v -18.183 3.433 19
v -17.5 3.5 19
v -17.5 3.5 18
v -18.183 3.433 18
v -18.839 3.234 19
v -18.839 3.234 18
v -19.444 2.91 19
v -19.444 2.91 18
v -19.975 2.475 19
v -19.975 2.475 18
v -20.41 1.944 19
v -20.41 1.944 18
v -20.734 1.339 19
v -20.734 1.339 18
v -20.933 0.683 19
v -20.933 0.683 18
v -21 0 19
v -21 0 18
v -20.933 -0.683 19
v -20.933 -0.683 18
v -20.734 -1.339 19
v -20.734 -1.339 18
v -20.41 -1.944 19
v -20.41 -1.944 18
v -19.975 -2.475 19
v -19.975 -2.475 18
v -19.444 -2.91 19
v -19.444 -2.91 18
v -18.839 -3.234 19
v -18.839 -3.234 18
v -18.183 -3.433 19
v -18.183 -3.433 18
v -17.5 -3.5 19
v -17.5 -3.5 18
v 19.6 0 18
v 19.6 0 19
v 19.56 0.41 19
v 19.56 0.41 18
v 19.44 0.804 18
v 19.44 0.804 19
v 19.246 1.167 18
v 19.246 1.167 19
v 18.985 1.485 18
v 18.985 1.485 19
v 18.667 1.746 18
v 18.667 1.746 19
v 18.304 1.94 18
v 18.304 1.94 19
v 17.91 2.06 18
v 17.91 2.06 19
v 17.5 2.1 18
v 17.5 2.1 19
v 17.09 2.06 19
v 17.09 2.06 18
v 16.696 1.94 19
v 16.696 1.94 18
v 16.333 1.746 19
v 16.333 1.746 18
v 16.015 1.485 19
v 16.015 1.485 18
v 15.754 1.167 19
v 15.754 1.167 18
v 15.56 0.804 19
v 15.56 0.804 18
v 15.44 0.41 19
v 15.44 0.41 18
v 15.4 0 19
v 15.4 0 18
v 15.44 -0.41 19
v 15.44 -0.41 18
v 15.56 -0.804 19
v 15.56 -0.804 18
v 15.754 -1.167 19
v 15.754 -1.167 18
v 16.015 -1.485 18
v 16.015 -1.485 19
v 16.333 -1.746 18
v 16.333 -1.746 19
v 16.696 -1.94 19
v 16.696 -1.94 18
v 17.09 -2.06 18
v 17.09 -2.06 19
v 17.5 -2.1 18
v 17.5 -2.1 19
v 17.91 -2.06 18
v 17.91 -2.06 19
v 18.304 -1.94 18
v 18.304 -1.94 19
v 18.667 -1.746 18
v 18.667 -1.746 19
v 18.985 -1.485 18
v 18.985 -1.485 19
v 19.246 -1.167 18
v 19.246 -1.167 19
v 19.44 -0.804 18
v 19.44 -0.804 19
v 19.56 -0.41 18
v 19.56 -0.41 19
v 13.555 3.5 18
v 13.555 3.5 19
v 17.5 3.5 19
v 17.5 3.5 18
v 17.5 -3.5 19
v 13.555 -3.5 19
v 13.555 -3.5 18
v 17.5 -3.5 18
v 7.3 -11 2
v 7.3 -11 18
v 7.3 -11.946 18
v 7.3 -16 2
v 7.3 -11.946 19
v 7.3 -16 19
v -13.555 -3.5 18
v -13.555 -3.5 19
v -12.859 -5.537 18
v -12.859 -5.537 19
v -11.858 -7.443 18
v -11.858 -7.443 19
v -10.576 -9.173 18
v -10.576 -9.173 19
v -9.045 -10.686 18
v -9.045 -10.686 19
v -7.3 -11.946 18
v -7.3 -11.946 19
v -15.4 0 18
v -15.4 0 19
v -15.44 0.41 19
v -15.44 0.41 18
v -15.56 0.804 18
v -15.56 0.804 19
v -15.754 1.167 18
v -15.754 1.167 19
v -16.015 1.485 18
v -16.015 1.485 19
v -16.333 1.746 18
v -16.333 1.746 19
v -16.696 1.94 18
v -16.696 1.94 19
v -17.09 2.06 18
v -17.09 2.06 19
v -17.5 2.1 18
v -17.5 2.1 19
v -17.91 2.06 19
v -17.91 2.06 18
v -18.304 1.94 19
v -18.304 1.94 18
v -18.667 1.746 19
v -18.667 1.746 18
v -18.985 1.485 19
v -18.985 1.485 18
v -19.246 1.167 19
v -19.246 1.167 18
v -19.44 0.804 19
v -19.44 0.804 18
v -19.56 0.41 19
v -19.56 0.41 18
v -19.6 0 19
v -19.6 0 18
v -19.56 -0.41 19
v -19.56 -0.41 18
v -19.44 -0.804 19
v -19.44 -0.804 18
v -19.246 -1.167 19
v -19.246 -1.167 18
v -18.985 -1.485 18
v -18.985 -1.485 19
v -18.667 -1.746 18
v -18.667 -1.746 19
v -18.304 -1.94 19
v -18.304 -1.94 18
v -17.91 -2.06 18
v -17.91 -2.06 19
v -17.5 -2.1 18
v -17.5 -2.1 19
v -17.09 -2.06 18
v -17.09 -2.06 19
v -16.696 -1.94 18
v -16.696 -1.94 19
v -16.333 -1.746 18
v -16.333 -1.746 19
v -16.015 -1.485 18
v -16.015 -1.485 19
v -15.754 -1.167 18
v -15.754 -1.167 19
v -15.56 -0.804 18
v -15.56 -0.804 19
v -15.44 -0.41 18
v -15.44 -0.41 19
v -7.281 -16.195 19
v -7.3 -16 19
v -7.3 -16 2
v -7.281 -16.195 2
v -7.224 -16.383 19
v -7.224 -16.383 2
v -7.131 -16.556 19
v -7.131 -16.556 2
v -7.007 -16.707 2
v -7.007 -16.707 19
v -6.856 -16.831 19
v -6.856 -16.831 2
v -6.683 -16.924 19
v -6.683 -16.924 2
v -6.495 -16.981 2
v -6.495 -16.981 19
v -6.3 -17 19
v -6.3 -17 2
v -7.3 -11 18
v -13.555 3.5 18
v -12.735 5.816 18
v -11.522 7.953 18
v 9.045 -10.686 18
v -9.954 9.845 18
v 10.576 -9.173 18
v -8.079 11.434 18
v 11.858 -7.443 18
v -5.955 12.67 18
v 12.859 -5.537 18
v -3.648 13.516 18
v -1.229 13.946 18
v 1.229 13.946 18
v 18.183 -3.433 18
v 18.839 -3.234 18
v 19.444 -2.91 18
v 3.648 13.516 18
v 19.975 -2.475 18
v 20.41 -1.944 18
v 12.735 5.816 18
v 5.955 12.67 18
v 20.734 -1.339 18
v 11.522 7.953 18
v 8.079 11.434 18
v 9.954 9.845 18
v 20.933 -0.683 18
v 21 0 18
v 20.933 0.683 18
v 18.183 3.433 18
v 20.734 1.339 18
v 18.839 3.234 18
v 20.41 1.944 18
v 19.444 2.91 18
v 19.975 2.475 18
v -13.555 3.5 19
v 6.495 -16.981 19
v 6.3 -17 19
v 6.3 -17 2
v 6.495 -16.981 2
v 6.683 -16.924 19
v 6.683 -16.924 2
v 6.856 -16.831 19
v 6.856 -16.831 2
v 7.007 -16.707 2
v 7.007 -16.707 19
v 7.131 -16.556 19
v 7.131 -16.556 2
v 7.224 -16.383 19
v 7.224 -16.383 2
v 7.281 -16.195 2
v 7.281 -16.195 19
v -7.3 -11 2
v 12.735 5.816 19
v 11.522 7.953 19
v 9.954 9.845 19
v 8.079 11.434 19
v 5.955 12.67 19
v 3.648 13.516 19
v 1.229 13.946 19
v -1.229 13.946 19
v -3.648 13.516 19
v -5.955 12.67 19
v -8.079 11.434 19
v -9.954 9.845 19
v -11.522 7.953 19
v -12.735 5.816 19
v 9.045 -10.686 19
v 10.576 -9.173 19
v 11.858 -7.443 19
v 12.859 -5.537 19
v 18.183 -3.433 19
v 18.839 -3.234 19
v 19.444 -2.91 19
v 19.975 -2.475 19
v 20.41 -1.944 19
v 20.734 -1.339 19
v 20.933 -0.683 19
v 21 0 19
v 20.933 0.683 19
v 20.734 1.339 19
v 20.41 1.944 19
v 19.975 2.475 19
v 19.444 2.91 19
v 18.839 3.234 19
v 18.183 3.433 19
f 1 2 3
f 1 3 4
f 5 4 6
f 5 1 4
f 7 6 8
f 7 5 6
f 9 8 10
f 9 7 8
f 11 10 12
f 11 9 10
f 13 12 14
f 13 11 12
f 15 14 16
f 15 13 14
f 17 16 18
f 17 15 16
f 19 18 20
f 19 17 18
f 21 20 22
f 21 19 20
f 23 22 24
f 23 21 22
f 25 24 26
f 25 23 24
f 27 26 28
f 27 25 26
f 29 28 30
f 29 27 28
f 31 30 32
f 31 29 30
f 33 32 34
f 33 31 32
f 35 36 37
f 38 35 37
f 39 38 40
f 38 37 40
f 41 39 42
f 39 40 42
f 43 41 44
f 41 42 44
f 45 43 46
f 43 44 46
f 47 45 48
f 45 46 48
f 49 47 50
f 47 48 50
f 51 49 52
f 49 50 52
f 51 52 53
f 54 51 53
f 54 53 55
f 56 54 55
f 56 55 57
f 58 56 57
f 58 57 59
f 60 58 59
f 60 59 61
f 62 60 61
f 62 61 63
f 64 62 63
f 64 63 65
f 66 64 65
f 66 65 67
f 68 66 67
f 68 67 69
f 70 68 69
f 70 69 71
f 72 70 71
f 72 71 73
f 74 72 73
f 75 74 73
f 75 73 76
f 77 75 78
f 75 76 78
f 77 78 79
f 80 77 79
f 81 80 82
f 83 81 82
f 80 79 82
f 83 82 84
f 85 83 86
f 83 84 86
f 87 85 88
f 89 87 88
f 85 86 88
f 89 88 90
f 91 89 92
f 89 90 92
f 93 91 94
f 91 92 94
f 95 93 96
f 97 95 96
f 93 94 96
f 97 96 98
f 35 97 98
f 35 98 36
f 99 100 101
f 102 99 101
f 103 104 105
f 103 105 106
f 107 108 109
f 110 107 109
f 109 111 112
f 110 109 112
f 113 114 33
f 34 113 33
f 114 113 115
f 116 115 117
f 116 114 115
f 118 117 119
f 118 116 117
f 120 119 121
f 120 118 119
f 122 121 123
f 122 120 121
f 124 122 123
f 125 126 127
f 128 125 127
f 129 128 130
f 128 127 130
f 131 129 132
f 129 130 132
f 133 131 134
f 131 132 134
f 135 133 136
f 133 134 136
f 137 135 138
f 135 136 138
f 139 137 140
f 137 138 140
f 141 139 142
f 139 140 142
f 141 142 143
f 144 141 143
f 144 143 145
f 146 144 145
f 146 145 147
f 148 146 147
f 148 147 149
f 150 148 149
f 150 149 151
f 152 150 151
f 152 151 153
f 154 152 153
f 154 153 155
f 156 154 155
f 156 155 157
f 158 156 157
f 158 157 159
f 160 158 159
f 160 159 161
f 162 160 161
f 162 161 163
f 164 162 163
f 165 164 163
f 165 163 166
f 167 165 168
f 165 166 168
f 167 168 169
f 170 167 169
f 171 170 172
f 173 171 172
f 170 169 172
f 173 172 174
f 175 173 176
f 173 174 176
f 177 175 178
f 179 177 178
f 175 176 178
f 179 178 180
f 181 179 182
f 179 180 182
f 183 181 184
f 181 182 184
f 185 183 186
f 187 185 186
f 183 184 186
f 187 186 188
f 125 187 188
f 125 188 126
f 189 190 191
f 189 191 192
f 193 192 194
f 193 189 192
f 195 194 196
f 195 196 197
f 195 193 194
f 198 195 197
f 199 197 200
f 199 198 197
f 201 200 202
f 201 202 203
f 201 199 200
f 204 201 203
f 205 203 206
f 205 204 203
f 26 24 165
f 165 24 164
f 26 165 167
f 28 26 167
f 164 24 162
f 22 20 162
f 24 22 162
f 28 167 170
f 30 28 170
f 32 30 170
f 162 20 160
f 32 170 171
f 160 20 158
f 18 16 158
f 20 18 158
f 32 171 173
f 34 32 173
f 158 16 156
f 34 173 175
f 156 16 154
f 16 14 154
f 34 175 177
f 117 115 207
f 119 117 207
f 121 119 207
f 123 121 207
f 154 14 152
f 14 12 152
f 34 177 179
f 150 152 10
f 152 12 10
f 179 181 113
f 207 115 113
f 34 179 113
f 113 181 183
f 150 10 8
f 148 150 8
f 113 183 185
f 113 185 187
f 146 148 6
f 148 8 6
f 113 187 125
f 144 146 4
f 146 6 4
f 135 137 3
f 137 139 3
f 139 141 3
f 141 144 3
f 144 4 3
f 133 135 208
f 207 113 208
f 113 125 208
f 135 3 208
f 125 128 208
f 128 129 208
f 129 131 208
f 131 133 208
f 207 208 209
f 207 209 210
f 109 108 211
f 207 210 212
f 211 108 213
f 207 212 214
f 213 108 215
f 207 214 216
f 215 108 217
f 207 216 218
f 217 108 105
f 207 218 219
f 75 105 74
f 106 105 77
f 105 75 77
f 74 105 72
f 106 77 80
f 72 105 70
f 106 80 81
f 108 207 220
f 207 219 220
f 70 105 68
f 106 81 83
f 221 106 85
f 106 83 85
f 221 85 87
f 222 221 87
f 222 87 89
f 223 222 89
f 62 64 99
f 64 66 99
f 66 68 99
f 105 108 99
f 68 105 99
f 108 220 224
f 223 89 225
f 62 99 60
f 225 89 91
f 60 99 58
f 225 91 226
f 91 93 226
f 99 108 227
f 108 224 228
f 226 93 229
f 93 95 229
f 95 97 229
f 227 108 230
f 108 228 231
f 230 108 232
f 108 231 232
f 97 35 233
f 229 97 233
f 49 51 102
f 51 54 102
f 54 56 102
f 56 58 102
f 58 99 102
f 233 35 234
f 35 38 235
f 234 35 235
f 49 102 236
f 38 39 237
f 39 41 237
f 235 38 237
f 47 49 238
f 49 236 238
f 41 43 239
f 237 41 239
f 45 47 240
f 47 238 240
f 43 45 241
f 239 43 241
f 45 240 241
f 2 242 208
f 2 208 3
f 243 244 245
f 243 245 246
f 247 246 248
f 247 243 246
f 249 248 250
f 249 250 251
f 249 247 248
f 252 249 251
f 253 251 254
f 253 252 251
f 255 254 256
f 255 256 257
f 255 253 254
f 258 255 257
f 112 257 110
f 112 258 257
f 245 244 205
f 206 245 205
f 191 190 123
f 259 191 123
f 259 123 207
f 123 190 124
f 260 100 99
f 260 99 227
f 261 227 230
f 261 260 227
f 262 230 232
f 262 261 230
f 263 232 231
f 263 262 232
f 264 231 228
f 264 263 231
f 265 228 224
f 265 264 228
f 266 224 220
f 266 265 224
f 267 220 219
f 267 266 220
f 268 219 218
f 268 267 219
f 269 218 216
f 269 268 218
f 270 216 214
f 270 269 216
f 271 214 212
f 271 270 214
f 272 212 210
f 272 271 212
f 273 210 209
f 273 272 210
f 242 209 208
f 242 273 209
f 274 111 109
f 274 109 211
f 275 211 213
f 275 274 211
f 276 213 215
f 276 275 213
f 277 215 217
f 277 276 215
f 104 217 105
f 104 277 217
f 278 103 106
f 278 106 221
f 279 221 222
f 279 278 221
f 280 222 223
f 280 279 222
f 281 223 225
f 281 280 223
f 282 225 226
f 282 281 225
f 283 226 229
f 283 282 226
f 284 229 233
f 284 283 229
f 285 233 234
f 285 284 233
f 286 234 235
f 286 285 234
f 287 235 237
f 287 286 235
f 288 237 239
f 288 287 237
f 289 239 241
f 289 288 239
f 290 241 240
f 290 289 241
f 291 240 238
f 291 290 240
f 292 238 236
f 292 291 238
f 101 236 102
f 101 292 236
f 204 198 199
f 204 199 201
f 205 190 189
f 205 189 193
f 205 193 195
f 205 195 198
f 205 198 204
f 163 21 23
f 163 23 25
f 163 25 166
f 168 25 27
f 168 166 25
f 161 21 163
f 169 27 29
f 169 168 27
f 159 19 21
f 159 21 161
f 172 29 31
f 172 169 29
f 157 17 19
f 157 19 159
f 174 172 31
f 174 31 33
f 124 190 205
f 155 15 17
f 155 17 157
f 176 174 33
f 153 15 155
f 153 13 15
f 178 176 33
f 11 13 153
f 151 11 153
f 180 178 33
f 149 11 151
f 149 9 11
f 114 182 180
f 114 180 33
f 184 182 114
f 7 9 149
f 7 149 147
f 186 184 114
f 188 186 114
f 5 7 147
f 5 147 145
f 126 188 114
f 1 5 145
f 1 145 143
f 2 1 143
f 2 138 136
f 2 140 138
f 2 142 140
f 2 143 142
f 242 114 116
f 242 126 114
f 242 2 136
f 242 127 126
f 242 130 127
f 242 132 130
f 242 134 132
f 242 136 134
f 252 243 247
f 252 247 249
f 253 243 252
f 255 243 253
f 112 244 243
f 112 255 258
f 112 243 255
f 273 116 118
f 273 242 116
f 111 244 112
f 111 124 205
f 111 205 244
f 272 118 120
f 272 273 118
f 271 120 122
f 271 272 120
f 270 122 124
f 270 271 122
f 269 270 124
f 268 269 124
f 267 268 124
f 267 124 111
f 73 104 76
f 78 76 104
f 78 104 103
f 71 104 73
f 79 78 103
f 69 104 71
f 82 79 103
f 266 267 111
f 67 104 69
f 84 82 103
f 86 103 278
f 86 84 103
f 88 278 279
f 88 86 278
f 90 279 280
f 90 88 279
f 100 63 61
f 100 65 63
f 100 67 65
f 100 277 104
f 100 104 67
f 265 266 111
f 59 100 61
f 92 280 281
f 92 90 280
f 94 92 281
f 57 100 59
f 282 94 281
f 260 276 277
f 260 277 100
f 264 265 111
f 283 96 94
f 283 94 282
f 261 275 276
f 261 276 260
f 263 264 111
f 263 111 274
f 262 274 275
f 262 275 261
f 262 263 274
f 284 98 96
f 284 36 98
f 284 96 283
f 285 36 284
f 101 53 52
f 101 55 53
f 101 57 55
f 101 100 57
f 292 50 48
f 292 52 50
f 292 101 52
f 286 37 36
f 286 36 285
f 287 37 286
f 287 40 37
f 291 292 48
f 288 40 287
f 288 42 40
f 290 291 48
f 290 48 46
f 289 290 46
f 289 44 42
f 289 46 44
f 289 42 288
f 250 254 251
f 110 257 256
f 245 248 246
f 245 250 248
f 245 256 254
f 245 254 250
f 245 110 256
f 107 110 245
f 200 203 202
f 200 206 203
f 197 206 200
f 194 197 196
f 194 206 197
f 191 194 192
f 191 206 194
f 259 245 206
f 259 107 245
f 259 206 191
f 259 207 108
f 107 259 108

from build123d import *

# Parameters (mm, degrees)
PAD028_DEPTH  = 1
SKETCH038_R   = 2.1
HOLE001_DEPTH = 25
PAD027_DEPTH  = 17


with BuildPart() as part:
    # Sketch037 (on Face1 of CopyPad003) → Pad028 (new body)
    with BuildSketch(Plane.XY.offset(19)):
        with BuildLine():
            ThreePointArc((-13.555442, -3.5), (0, -14), (13.555442, -3.5))
            Line((13.555442, -3.5), (17.5, -3.5))
            ThreePointArc((17.5, -3.5), (21, 0), (17.5, 3.5))
            Line((13.555442, 3.5), (17.5, 3.5))
            ThreePointArc((13.555442, 3.5), (0, 14), (-13.555442, 3.5))
            Line((-13.555442, 3.5), (-17.5, 3.5))
            ThreePointArc((-17.5, 3.5), (-21, 0), (-17.5, -3.5))
            Line((-13.555442, -3.5), (-17.5, -3.5))
        make_face()
    extrude(amount=-PAD028_DEPTH)

    # Sketch038 (on Face9 of Pad028) → Hole001 (cut)
    with BuildSketch(Plane.XY.offset(19)):
        with Locations((-17.5, 0)):
            Circle(SKETCH038_R)
        with Locations((17.5, 0)):
            Circle(SKETCH038_R)
    extrude(amount=-HOLE001_DEPTH, mode=Mode.SUBTRACT)

    # Sketch006 (on Face4 of Hole001) → Pad027 (join)
    with BuildSketch(Plane.XY.offset(19)):
        with BuildLine():
            Line((-7.3, -11), (7.3, -11))
            Line((7.3, -11), (7.3, -16))
            ThreePointArc((6.3, -17), (7.007107, -16.707107), (7.3, -16))
            Line((6.3, -17), (-6.3, -17))
            ThreePointArc((-7.3, -16), (-7.007107, -16.707107), (-6.3, -17))
            Line((-7.3, -16), (-7.3, -11))
        make_face()
    extrude(amount=-PAD027_DEPTH)


solid = part.part
